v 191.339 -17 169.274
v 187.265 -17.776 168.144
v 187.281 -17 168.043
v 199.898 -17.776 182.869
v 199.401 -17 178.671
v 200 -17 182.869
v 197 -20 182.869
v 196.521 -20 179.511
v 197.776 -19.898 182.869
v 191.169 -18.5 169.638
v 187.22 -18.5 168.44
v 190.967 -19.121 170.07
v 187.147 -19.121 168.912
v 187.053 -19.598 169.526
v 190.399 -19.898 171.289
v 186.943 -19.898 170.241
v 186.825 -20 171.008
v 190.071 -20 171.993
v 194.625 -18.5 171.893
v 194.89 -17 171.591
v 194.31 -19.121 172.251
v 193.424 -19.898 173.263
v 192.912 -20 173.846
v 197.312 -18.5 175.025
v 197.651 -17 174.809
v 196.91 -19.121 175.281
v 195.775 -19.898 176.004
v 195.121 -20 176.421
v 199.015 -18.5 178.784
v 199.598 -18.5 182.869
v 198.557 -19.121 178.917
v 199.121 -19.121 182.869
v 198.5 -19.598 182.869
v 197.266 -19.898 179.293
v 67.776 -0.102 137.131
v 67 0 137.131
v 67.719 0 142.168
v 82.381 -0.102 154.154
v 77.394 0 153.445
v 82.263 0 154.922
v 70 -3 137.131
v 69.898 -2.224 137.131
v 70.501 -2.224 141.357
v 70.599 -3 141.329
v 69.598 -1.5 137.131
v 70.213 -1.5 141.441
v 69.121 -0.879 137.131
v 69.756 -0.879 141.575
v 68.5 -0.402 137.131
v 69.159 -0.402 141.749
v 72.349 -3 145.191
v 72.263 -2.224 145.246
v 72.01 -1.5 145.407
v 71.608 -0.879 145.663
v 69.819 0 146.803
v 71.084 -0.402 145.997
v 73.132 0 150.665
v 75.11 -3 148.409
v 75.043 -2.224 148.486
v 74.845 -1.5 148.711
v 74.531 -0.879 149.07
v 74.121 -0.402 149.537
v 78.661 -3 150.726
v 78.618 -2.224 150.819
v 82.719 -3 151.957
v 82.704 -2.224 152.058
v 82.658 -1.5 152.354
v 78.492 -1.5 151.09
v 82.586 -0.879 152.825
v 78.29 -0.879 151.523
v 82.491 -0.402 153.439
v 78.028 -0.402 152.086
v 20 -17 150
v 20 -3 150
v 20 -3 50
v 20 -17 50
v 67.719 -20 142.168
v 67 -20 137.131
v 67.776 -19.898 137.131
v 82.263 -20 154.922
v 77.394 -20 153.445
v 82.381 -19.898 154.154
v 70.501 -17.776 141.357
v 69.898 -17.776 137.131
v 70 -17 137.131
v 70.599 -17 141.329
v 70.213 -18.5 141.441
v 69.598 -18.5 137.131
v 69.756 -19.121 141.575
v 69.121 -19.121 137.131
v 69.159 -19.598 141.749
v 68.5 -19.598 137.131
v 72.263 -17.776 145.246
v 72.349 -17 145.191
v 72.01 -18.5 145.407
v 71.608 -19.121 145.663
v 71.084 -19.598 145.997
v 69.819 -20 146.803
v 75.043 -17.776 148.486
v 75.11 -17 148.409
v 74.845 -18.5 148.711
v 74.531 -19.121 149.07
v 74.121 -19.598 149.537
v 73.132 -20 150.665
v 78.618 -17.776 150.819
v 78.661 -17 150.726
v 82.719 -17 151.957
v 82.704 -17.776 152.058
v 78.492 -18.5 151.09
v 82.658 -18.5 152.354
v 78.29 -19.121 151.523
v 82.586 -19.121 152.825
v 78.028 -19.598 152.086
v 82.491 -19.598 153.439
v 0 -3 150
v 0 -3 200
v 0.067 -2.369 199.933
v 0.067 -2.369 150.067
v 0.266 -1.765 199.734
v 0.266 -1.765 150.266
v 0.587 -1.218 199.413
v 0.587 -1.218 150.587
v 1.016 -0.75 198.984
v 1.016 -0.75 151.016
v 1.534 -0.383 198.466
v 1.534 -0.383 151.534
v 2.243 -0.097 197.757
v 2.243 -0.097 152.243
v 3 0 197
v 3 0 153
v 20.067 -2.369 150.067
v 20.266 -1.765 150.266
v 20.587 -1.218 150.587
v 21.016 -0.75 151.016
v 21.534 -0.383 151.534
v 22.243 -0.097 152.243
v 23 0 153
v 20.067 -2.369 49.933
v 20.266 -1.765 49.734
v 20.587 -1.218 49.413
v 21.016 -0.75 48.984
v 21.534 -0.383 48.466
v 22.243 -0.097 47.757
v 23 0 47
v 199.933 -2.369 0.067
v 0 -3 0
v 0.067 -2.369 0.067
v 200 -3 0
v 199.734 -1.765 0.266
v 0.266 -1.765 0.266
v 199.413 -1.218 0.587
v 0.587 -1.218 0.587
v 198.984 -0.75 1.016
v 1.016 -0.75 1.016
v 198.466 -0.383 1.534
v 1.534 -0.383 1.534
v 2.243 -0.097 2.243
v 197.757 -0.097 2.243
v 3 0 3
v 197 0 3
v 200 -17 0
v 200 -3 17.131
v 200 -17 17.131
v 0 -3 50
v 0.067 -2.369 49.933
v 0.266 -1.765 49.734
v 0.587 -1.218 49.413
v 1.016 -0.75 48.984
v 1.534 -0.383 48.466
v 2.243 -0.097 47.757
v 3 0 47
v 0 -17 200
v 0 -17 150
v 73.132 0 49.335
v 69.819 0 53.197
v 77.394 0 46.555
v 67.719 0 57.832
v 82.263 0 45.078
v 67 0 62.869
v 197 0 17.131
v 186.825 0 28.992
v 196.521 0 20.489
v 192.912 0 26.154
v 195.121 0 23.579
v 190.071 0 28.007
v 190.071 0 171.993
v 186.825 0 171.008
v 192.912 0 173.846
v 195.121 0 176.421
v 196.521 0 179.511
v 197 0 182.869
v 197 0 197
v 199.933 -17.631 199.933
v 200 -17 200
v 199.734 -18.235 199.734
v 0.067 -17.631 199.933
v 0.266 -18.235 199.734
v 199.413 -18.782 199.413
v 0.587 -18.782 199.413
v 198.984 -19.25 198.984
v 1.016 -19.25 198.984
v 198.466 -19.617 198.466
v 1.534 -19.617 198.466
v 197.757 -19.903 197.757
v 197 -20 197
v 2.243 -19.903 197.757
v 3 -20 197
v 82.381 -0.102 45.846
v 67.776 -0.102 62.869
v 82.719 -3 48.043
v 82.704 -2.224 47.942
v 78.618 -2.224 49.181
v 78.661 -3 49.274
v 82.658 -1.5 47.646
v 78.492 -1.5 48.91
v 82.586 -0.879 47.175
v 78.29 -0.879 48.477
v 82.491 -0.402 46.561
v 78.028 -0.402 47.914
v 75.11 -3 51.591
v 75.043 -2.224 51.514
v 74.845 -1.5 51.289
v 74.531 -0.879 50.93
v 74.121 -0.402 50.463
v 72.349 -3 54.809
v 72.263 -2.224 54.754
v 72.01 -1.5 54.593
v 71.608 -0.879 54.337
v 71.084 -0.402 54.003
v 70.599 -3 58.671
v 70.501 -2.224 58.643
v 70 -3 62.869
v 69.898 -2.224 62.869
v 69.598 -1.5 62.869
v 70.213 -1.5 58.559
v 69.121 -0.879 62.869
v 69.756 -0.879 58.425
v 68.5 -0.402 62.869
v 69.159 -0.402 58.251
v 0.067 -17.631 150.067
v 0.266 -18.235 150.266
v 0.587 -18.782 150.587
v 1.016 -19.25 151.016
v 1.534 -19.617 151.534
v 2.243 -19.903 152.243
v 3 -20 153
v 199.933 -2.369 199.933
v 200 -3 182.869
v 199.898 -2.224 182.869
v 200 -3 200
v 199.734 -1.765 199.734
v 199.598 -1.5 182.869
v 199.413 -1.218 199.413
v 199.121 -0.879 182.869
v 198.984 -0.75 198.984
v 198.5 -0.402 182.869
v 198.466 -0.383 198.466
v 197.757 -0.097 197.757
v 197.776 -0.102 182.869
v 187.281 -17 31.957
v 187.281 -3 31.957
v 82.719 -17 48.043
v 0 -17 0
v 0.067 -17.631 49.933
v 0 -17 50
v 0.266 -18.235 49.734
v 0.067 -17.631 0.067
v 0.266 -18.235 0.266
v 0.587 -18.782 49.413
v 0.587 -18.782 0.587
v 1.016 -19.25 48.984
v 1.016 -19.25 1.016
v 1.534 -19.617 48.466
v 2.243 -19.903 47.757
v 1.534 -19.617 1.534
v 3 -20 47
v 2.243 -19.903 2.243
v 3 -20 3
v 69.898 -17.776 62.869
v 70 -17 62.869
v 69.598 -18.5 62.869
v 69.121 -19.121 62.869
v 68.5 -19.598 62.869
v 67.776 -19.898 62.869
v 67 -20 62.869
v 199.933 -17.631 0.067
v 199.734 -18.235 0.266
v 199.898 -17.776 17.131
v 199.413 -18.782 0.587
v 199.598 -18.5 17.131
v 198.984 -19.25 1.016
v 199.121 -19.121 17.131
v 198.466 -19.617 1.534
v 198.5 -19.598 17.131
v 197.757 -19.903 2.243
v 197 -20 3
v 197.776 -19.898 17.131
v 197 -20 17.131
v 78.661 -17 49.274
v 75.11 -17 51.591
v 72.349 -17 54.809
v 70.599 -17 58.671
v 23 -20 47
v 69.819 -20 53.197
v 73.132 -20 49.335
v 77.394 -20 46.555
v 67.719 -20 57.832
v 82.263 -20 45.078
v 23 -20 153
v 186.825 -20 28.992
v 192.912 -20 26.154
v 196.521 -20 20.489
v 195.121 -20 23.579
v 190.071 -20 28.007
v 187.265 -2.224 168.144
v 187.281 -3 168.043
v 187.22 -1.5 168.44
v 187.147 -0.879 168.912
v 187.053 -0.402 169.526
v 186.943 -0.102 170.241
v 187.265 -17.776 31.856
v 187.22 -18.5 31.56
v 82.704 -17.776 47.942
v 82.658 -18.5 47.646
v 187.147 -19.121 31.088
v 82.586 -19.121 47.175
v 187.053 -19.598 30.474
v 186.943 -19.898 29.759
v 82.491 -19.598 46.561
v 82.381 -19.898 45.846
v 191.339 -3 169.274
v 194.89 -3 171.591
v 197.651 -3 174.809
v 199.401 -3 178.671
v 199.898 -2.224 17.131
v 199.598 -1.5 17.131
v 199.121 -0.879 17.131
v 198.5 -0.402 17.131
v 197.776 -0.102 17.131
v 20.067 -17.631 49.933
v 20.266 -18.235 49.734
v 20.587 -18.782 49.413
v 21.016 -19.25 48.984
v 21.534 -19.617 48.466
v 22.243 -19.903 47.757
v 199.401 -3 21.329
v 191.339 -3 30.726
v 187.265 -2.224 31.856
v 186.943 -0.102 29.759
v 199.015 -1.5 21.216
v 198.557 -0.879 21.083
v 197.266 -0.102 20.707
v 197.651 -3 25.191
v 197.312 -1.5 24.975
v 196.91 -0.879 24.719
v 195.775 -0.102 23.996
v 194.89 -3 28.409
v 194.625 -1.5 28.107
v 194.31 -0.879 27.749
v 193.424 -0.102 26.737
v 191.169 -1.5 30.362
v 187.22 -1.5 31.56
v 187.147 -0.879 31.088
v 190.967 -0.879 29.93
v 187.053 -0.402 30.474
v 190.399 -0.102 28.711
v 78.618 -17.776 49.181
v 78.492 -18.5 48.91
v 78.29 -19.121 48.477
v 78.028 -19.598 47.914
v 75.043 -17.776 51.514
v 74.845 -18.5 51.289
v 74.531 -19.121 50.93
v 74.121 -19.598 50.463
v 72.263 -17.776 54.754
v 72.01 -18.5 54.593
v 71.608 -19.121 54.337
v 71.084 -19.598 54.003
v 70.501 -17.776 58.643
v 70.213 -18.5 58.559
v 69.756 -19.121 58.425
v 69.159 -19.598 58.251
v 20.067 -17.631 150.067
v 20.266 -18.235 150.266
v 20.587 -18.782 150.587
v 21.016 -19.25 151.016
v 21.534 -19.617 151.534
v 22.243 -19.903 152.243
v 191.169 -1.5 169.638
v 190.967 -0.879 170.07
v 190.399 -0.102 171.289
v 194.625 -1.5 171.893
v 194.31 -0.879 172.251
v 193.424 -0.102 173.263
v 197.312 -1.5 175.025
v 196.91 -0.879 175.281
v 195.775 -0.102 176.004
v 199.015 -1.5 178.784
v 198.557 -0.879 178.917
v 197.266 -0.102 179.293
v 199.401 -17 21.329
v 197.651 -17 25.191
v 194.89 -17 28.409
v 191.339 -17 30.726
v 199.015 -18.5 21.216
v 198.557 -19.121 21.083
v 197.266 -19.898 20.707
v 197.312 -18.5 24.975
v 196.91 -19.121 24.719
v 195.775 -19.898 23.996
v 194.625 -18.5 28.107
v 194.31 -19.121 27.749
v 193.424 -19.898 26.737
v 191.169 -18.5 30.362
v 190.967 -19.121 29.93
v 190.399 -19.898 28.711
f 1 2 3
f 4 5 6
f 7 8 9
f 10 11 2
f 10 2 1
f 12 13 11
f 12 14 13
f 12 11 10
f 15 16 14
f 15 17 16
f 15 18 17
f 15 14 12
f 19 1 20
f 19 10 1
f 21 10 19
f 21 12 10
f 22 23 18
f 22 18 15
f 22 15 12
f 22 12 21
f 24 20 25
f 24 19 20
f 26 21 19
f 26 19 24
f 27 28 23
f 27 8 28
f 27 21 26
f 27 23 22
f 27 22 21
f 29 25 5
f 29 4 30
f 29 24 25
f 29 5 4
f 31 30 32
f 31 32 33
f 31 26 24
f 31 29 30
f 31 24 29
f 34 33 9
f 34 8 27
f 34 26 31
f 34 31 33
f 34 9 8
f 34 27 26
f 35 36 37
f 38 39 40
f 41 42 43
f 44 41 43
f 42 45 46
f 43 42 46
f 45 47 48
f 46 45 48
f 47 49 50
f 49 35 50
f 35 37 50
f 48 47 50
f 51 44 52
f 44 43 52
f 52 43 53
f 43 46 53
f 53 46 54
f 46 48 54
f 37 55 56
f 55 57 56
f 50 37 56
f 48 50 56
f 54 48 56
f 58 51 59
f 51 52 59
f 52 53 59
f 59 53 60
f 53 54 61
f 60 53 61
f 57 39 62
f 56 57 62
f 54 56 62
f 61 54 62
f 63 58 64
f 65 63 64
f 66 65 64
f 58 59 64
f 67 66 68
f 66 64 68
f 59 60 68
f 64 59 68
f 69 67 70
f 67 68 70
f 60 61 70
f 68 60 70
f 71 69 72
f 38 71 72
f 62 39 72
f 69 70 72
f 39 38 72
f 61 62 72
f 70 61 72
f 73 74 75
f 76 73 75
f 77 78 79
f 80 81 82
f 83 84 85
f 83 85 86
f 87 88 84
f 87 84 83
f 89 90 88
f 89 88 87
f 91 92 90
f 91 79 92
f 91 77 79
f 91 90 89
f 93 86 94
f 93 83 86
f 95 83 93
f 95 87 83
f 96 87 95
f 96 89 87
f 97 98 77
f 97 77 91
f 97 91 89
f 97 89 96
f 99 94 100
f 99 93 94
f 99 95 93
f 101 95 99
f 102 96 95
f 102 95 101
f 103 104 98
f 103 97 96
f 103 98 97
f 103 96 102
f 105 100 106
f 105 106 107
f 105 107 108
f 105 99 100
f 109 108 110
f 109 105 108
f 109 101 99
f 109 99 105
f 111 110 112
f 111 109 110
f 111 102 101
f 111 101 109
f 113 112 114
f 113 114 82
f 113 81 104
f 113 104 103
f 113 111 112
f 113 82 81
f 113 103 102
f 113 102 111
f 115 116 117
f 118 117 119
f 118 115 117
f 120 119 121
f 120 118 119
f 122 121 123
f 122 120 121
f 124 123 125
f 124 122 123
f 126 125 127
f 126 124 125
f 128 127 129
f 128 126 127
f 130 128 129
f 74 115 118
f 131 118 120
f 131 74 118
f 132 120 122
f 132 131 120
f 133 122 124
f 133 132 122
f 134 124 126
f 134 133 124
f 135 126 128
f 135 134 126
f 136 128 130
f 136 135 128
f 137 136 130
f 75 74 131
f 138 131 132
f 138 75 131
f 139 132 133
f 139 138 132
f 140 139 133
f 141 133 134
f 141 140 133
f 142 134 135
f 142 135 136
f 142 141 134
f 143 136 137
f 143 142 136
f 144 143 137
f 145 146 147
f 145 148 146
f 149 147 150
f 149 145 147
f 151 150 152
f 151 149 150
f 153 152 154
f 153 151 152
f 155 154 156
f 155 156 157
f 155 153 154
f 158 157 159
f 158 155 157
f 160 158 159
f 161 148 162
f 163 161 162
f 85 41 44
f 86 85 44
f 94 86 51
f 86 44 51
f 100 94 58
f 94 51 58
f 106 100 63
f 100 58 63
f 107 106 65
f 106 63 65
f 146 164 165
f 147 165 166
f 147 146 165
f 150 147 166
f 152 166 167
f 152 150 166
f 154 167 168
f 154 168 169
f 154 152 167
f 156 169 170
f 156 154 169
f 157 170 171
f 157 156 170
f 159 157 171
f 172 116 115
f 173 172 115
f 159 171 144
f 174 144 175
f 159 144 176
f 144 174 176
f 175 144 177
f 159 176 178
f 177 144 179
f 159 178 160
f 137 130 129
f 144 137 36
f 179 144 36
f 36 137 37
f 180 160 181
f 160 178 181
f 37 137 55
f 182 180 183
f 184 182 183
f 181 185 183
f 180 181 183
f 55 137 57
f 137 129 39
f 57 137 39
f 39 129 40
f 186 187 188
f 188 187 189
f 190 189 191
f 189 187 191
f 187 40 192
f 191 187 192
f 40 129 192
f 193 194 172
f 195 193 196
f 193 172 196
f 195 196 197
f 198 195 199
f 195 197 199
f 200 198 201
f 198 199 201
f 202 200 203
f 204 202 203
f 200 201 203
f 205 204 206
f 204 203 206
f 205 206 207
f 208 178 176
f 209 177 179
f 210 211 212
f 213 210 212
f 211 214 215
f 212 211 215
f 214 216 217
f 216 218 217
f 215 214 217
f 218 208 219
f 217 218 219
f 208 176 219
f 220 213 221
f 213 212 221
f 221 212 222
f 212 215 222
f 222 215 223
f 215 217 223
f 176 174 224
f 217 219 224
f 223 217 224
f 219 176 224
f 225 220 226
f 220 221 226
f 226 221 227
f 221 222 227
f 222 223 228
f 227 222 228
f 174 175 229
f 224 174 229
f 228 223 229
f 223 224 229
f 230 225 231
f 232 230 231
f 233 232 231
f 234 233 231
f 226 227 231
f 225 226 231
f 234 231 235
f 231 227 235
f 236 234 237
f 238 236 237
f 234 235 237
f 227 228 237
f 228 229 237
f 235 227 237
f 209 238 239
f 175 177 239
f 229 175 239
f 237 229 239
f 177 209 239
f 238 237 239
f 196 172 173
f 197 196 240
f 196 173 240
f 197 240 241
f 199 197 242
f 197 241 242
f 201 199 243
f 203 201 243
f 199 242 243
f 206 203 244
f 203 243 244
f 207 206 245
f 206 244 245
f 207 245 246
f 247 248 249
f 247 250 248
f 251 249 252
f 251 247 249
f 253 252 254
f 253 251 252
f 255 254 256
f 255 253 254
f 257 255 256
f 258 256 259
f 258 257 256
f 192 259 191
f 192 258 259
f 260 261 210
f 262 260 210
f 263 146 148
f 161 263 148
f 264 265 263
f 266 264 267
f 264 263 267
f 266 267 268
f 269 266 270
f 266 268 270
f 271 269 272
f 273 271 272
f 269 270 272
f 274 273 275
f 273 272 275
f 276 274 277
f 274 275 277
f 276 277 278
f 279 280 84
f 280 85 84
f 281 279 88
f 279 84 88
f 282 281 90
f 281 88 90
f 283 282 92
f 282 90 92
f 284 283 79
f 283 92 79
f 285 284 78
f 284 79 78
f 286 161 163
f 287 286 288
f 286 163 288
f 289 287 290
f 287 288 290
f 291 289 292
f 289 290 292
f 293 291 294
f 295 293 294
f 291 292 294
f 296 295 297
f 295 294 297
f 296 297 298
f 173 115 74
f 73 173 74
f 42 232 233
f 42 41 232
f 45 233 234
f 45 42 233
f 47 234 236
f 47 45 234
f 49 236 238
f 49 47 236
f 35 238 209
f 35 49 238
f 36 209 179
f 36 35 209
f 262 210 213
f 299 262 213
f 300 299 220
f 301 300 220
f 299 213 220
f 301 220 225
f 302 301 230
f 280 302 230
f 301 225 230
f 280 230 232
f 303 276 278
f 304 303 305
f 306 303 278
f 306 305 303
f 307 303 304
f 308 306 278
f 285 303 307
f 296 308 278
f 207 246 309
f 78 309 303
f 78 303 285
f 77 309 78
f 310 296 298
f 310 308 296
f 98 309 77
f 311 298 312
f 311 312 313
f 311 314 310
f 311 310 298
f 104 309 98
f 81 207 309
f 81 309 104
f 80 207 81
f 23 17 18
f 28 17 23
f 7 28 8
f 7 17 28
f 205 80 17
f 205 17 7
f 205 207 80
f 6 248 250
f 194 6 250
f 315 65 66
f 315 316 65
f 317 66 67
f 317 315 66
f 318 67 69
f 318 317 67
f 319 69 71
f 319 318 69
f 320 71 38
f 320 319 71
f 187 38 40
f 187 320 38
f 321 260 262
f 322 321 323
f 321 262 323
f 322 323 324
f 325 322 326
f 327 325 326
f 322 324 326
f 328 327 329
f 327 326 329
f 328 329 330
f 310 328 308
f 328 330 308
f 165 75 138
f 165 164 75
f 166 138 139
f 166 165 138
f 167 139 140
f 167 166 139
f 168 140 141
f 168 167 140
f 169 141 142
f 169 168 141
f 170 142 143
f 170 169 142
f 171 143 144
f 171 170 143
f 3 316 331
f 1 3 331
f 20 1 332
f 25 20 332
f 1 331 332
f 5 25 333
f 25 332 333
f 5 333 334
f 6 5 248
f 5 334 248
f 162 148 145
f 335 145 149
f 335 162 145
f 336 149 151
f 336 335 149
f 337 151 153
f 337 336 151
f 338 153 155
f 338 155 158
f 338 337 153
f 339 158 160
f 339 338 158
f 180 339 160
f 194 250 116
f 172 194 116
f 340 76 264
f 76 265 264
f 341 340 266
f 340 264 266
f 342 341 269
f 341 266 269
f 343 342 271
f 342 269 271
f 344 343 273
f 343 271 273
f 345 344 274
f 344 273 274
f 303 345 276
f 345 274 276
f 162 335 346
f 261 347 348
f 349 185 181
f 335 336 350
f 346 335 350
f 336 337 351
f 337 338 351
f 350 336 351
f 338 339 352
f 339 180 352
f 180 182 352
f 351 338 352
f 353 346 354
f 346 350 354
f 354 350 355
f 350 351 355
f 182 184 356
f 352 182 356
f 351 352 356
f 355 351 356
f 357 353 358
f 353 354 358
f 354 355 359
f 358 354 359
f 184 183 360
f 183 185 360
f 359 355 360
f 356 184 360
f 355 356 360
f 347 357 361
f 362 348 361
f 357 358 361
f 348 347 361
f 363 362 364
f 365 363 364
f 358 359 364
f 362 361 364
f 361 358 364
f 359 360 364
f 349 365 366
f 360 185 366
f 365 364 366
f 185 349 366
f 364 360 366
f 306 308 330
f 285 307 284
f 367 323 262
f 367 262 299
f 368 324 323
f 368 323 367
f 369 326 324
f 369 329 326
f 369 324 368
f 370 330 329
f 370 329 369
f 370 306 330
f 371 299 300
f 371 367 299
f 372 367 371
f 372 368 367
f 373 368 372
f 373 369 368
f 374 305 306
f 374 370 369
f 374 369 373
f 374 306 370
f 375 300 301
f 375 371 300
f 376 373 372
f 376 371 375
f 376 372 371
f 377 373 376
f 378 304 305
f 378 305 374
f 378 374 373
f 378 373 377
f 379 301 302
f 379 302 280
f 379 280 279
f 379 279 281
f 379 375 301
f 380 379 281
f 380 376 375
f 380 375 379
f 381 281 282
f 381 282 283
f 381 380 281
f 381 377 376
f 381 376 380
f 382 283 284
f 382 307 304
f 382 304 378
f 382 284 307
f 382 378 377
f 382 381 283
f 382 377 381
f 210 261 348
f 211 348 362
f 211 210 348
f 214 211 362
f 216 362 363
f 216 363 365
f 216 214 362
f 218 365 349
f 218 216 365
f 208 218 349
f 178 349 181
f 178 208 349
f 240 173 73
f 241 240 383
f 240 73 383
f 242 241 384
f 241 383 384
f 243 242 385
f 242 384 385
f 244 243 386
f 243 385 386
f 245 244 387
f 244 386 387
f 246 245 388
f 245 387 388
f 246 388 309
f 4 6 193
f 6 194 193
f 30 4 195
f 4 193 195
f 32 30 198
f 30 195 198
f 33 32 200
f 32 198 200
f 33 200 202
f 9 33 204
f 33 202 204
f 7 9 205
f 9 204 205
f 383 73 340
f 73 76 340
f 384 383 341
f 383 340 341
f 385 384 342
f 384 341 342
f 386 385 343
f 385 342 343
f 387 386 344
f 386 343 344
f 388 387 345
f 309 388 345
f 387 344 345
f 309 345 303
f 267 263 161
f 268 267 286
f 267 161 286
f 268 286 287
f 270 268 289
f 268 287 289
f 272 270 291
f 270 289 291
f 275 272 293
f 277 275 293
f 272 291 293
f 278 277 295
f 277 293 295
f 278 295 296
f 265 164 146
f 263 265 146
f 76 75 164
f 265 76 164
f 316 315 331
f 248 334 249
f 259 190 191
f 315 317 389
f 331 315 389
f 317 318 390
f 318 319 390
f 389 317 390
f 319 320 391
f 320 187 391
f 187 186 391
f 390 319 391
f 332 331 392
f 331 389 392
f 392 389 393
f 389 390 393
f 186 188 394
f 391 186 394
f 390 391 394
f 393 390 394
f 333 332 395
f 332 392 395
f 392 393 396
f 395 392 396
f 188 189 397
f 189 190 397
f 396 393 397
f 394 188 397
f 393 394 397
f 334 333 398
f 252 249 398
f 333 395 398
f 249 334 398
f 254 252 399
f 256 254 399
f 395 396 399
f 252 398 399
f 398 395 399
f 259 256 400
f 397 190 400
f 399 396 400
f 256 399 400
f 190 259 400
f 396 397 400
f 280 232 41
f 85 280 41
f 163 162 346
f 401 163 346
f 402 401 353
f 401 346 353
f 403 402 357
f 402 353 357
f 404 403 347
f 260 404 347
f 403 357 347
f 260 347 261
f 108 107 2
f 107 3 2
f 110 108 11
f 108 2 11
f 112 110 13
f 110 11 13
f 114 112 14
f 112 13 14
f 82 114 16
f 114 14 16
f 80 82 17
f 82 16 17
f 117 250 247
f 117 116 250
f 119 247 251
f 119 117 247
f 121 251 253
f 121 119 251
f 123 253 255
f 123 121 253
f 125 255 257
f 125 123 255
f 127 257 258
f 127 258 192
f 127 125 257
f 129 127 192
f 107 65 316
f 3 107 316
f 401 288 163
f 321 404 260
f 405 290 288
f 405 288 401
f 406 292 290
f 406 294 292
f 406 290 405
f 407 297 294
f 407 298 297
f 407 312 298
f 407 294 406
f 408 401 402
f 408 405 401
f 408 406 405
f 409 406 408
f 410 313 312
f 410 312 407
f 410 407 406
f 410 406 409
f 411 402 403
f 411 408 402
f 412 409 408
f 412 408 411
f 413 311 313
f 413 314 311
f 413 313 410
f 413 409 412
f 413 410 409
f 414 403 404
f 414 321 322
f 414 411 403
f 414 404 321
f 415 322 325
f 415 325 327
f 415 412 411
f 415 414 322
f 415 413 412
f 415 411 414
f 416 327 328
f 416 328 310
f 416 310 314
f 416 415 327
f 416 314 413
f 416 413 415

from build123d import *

# Parameters (mm, degrees)
F1_DEPTH = 20
F2_R     = 3


with BuildPart() as f1:
    # F0 (on Front) → F1 (new body)
    with BuildSketch(Plane.XZ):
        with BuildLine():
            Line((0, 50), (0, 0))
            Line((0, 0), (200, 0))
            Line((200, 0), (200, 17.131216))
            ThreePointArc((200, 17.131216), (196.384482, 26.898179), (187.280858, 31.956791))
            Line((187.280858, 31.956791), (82.719142, 48.043209))
            ThreePointArc((82.719142, 48.043209), (73.615518, 53.101821), (70, 62.868784))
            Line((70, 62.868784), (70, 137.131216))
            ThreePointArc((70, 137.131216), (73.615518, 146.898179), (82.719142, 151.956791))
            Line((82.719142, 151.956791), (187.280858, 168.043209))
            ThreePointArc((187.280858, 168.043209), (196.384482, 173.101821), (200, 182.868784))
            Line((200, 182.868784), (200, 200))
            Line((200, 200), (0, 200))
            Line((0, 200), (0, 150))
            Line((0, 150), (20, 150))
            Line((20, 150), (20, 50))
            Line((20, 50), (0, 50))
        make_face()
    extrude(amount=F1_DEPTH)

    # F2
    f2_edges = [f1.edges().sort_by_distance(p)[0] for p in [
        (196.384482, -20, 173.101821),
        (200, -20, 191.434392),
        (100, -20, 200),
        (0, -20, 175),
        (10, -20, 150),
        (20, -20, 100),
        (10, -20, 50),
        (0, -20, 25),
        (100, -20, 0),
        (200, -20, 8.565608),
        (196.384482, -20, 26.898179),
        (135, -20, 40),
        (73.615518, -20, 53.101821),
        (70, -20, 100),
        (73.615518, -20, 146.898179),
        (135, -20, 160),
        (196.384482, 0, 173.101821),
        (200, 0, 191.434392),
        (100, 0, 200),
        (0, 0, 175),
        (10, 0, 150),
        (20, 0, 100),
        (10, 0, 50),
        (0, 0, 25),
        (100, 0, 0),
        (200, 0, 8.565608),
        (196.384482, 0, 26.898179),
        (135, 0, 40),
        (73.615518, 0, 53.101821),
        (70, 0, 100),
        (73.615518, 0, 146.898179),
        (135, 0, 160),
    ]]
    fillet(f2_edges, radius=F2_R)


solid = f1.part
